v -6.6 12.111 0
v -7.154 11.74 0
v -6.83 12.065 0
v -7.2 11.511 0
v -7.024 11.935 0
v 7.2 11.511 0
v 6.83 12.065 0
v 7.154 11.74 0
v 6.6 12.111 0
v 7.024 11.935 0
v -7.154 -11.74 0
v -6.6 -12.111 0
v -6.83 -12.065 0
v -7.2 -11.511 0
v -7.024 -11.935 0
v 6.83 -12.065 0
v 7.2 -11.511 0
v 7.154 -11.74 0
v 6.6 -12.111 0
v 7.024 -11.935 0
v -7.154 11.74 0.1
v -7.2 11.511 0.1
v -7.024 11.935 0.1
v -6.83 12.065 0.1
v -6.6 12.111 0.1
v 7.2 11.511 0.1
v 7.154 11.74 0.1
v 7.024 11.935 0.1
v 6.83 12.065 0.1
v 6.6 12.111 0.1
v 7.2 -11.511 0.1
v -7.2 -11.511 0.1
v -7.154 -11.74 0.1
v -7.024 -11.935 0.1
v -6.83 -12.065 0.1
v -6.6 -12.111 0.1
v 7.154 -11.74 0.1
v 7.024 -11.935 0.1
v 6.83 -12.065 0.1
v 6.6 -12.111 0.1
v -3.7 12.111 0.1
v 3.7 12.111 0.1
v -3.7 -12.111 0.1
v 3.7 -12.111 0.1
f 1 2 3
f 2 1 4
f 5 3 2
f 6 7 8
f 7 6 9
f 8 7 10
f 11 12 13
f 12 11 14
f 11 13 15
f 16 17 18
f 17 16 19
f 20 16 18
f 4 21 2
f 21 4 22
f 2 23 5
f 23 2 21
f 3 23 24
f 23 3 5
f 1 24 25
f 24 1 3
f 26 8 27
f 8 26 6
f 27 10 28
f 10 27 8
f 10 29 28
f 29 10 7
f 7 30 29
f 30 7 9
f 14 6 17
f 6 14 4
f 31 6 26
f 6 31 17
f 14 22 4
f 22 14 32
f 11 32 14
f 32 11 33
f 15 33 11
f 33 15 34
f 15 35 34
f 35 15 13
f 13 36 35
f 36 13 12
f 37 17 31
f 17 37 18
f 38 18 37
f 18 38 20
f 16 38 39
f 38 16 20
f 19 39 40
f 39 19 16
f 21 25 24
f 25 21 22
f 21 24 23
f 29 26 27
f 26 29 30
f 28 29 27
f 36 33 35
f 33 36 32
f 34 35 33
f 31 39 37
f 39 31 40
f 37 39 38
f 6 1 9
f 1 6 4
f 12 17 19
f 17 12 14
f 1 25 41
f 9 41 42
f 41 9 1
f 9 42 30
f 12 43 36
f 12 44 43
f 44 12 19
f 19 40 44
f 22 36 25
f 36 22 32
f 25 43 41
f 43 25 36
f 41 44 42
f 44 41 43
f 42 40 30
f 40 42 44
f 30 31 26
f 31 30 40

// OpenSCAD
// file: ../p/box3u12.scad
use <../lib.scad>
function ldraw_lib__box3u12() = [
// 0 Box with 3 Parallel Faces without Any Edges
// 0 Name: box3u12.dat
// 0 Author: J.C. Tchang [tchang]
// 0 !LDRAW_ORG Primitive UPDATE 2014-02
// 0 !LICENSE Licensed under CC BY 2.0 and CC BY 4.0 : see CAreadme.txt
// 
// 0 BFC CERTIFY CCW
  [0,"BFC","CERTIFY"],
  [0,"BFC","CCW"],
// 
// 0 !HISTORY 2014-12-23 [PTadmin] Official Update 2014-02
// 
// 
// 4 16 -1 1 1 1 1 1 1 1 -1 -1 1 -1
  [4,16,-1,1,1,1,1,1,1,1,-1,-1,1,-1],
// 4 16 -1 1 1 -1 0 1 1 0 1 1 1 1
  [4,16,-1,1,1,-1,0,1,1,0,1,1,1,1],
// 4 16 1 1 -1 1 0 -1 -1 0 -1 -1 1 -1
  [4,16,1,1,-1,1,0,-1,-1,0,-1,-1,1,-1],
];
module ldraw_lib__box3u12(step=0, col=false, unit=2/5, alt=false, line=0.2, solid=!$preview)
    makepoly(ldraw_lib__box3u12(), step=step, col=col, unit=unit, alt=alt, line=line, solid=solid);
ldraw_lib__box3u12(line=0.2);
// file: ../p/1-4cyli.scad
use <../lib.scad>
function ldraw_lib__1_4cyli() = [
// 0 Cylinder 0.25
// 0 Name: 1-4cyli.dat
// 0 Author: James Jessiman
// 0 !LDRAW_ORG Primitive UPDATE 2012-01
// 0 !LICENSE Licensed under CC BY 2.0 and CC BY 4.0 : see CAreadme.txt
// 
// 0 BFC CERTIFY CCW
  [0,"BFC","CERTIFY"],
  [0,"BFC","CCW"],
// 
// 0 !HISTORY 2002-03-23 [sbliss] Added BFC statement.
// 0 !HISTORY 2002-04-25 [PTadmin] Official Update 2002-02
// 0 !HISTORY 2007-06-22 [PTadmin] Header formatted for Contributor Agreement
// 0 !HISTORY 2008-07-01 [PTadmin] Official Update 2008-01
// 0 !HISTORY 2012-02-16 [Philo] Changed to CCW
// 0 !HISTORY 2012-03-30 [PTadmin] Official Update 2012-01
// 
// 
// 4 16 1 1 0 0.9239 1 0.3827 0.9239 0 0.3827 1 0 0
  [4,16,1,1,0,0.9239,1,0.3827,0.9239,0,0.3827,1,0,0],
// 5 24 1 0 0 1 1 0 0.9239 0 0.3827 1 0 -1
  [5,24,1,0,0,1,1,0,0.9239,0,0.3827,1,0,-1],
// 4 16 0.9239 1 0.3827 0.7071 1 0.7071 0.7071 0 0.7071 0.9239 0 0.3827
  [4,16,0.9239,1,0.3827,0.7071,1,0.7071,0.7071,0,0.7071,0.9239,0,0.3827],
// 5 24 0.9239 0 0.3827 0.9239 1 0.3827 0.7071 0 0.7071 1 0 0
  [5,24,0.9239,0,0.3827,0.9239,1,0.3827,0.7071,0,0.7071,1,0,0],
// 4 16 0.7071 1 0.7071 0.3827 1 0.9239 0.3827 0 0.9239 0.7071 0 0.7071
  [4,16,0.7071,1,0.7071,0.3827,1,0.9239,0.3827,0,0.9239,0.7071,0,0.7071],
// 5 24 0.7071 0 0.7071 0.7071 1 0.7071 0.3827 0 0.9239 0.9239 0 0.3827
  [5,24,0.7071,0,0.7071,0.7071,1,0.7071,0.3827,0,0.9239,0.9239,0,0.3827],
// 4 16 0.3827 1 0.9239 0 1 1 0 0 1 0.3827 0 0.9239
  [4,16,0.3827,1,0.9239,0,1,1,0,0,1,0.3827,0,0.9239],
// 5 24 0.3827 0 0.9239 0.3827 1 0.9239 0 0 1 0.7071 0 0.7071
  [5,24,0.3827,0,0.9239,0.3827,1,0.9239,0,0,1,0.7071,0,0.7071],
// 5 24 0 0 1 0 1 1 0.3827 0 0.9239 -1 0 1
  [5,24,0,0,1,0,1,1,0.3827,0,0.9239,-1,0,1],
];
module ldraw_lib__1_4cyli(step=0, col=false, unit=2/5, alt=false, line=0.2, solid=!$preview)
    makepoly(ldraw_lib__1_4cyli(), step=step, col=col, unit=unit, alt=alt, line=line, solid=solid);
ldraw_lib__1_4cyli(line=0.2);
// file: ../p/1-4chrd.scad
use <../lib.scad>
function ldraw_lib__1_4chrd() = [
// 0 Chord 0.25
// 0 Name: 1-4chrd.dat
// 0 Author: Tony Hafner [hafhead]
// 0 !LDRAW_ORG Primitive UPDATE 2012-02
// 0 !LICENSE Licensed under CC BY 2.0 and CC BY 4.0 : see CAreadme.txt
// 
// 0 BFC CERTIFY CCW
  [0,"BFC","CERTIFY"],
  [0,"BFC","CCW"],
// 
// 0 !HISTORY 2004-04-22 [PTadmin] Official Update 2004-02
// 0 !HISTORY 2007-10-09 [PTadmin] Header formatted for Contributor Agreement
// 0 !HISTORY 2008-07-01 [PTadmin] Official Update 2008-01
// 0 !HISTORY 2012-08-02 [MMR1988] Re-creation with PrimGen2 and Rectifier
// 0 !HISTORY 2012-08-09 [PTadmin] Official Update 2012-02
// 
// 
// 4 16 0.9239 0 0.3827 0.3827 0 0.9239 0 0 1 1 0 0
  [4,16,0.9239,0,0.3827,0.3827,0,0.9239,0,0,1,1,0,0],
// 3 16 0.7071 0 0.7071 0.3827 0 0.9239 0.9239 0 0.3827
  [3,16,0.7071,0,0.7071,0.3827,0,0.9239,0.9239,0,0.3827],
];
module ldraw_lib__1_4chrd(step=0, col=false, unit=2/5, alt=false, line=0.2, solid=!$preview)
    makepoly(ldraw_lib__1_4chrd(), step=step, col=col, unit=unit, alt=alt, line=line, solid=solid);
ldraw_lib__1_4chrd(line=0.2);
// main file
use <../lib.scad>
use <../p/1-4chrd.scad>
use <../p/1-4cyli.scad>
use <../p/box3u12.scad>
function ldraw_lib__6142617t() = [
// 0 Sticker  3.0 x  1.8 with Black Stripe on White Background
// 0 Name: 6142617t.dat
// 0 Author: Massimo Maso [Sirio]
// 0 !LDRAW_ORG Part UPDATE 2022-05
// 0 !LICENSE Licensed under CC BY 2.0 and CC BY 4.0 : see CAreadme.txt
// 
// 0 BFC CERTIFY CCW
  [0,"BFC","CERTIFY"],
  [0,"BFC","CCW"],
// 
// 0 !KEYWORDS 1969, Camaro, Chevrolet, Drag, Race, Set 75874, Speed Champions
// 0 !KEYWORDS Z/28
// 
// 0 !HISTORY 2022-09-15 [PTadmin] Official Update 2022-05
// 
// 
// 0 // Primitives
// 1 16 -16.5 0 28.7768 -1.5 0 0 0 -1 0 0 0 1.5 1-4chrd.dat
  [1,16,-16.5,0,28.7768,-1.5,0,0,0,-1,0,0,0,1.5, ldraw_lib__1_4chrd()],
// 1 16 16.5 0 28.7768 1.5 0 0 0 -1 0 0 0 1.5 1-4chrd.dat
  [1,16,16.5,0,28.7768,1.5,0,0,0,-1,0,0,0,1.5, ldraw_lib__1_4chrd()],
// 1 16 -16.5 0 -28.7768 -1.5 0 0 0 -1 0 0 0 -1.5 1-4chrd.dat
  [1,16,-16.5,0,-28.7768,-1.5,0,0,0,-1,0,0,0,-1.5, ldraw_lib__1_4chrd()],
// 1 16 16.5 0 -28.7768 1.5 0 0 0 -1 0 0 0 -1.5 1-4chrd.dat
  [1,16,16.5,0,-28.7768,1.5,0,0,0,-1,0,0,0,-1.5, ldraw_lib__1_4chrd()],
// 1 16 -16.5 -0.25 28.7768 -1.5 0 0 0 0.25 0 0 0 1.5 1-4cyli.dat
  [1,16,-16.5,-0.25,28.7768,-1.5,0,0,0,0.25,0,0,0,1.5, ldraw_lib__1_4cyli()],
// 1 16 16.5 -0.25 28.7768 1.5 0 0 0 0.25 0 0 0 1.5 1-4cyli.dat
  [1,16,16.5,-0.25,28.7768,1.5,0,0,0,0.25,0,0,0,1.5, ldraw_lib__1_4cyli()],
// 1 16 0 -.25 0 0 0 18 0 .25 0 28.7768 0 0 box3u12.dat
  [1,16,0,-.25,0,0,0,18,0,.25,0,28.7768,0,0, ldraw_lib__box3u12()],
// 1 16 -16.5 -0.25 -28.7768 -1.5 0 0 0 0.25 0 0 0 -1.5 1-4cyli.dat
  [1,16,-16.5,-0.25,-28.7768,-1.5,0,0,0,0.25,0,0,0,-1.5, ldraw_lib__1_4cyli()],
// 1 16 16.5 -0.25 -28.7768 1.5 0 0 0 0.25 0 0 0 -1.5 1-4cyli.dat
  [1,16,16.5,-0.25,-28.7768,1.5,0,0,0,0.25,0,0,0,-1.5, ldraw_lib__1_4cyli()],
// 1 15 -16.5 -.25 28.7768 -1.5 0 0 0 1 0 0 0 1.5 1-4chrd.dat
  [1,15,-16.5,-.25,28.7768,-1.5,0,0,0,1,0,0,0,1.5, ldraw_lib__1_4chrd()],
// 1 15 16.5 -.25 28.7768 1.5 0 0 0 1 0 0 0 1.5 1-4chrd.dat
  [1,15,16.5,-.25,28.7768,1.5,0,0,0,1,0,0,0,1.5, ldraw_lib__1_4chrd()],
// 1 15 -16.5 -.25 -28.7768 -1.5 0 0 0 1 0 0 0 -1.5 1-4chrd.dat
  [1,15,-16.5,-.25,-28.7768,-1.5,0,0,0,1,0,0,0,-1.5, ldraw_lib__1_4chrd()],
// 1 15 16.5 -.25 -28.7768 1.5 0 0 0 1 0 0 0 -1.5 1-4chrd.dat
  [1,15,16.5,-.25,-28.7768,1.5,0,0,0,1,0,0,0,-1.5, ldraw_lib__1_4chrd()],
// 0 // Bottom face
// 4 16 -16.5 0 30.2768 16.5 0 30.2768 18 0 28.7768 -18 0 28.7768
  [4,16,-16.5,0,30.2768,16.5,0,30.2768,18,0,28.7768,-18,0,28.7768],
// 4 16 -16.5 0 -30.2768 -18 0 -28.7768 18 0 -28.7768 16.5 0 -30.2768
  [4,16,-16.5,0,-30.2768,-18,0,-28.7768,18,0,-28.7768,16.5,0,-30.2768],
// 0 // Lateral face
// 3 16 -16.5 0 30.2768 -16.5 -.25 30.2768 -9.25 -.25 30.2768
  [3,16,-16.5,0,30.2768,-16.5,-.25,30.2768,-9.25,-.25,30.2768],
// 4 16 -16.5 0 30.2768 -9.25 -.25 30.2768 9.25 -.25 30.2768 16.5 0 30.2768
  [4,16,-16.5,0,30.2768,-9.25,-.25,30.2768,9.25,-.25,30.2768,16.5,0,30.2768],
// 3 16 16.5 0 30.2768 9.25 -.25 30.2768 16.5 -.25 30.2768
  [3,16,16.5,0,30.2768,9.25,-.25,30.2768,16.5,-.25,30.2768],
// 3 16 -16.5 0 -30.2768 -9.25 -.25 -30.2768 -16.5 -.25 -30.2768
  [3,16,-16.5,0,-30.2768,-9.25,-.25,-30.2768,-16.5,-.25,-30.2768],
// 4 16 -16.5 0 -30.2768 16.5 0 -30.2768 9.25 -.25 -30.2768 -9.25 -.25 -30.2768
  [4,16,-16.5,0,-30.2768,16.5,0,-30.2768,9.25,-.25,-30.2768,-9.25,-.25,-30.2768],
// 3 16 16.5 0 -30.2768 16.5 -.25 -30.2768 9.25 -.25 -30.2768
  [3,16,16.5,0,-30.2768,16.5,-.25,-30.2768,9.25,-.25,-30.2768],
// 0 // Top face
// 4 15 -16.5 -.25 30.2768 -18 -.25 28.7768 -18 -.25 -28.7768 -16.5 -.25 -30.2768
  [4,15,-16.5,-.25,30.2768,-18,-.25,28.7768,-18,-.25,-28.7768,-16.5,-.25,-30.2768],
// 4 15 -16.5 -.25 30.2768 -16.5 -.25 -30.2768 -9.25 -.25 -30.2768 -9.25 -.25 30.2768
  [4,15,-16.5,-.25,30.2768,-16.5,-.25,-30.2768,-9.25,-.25,-30.2768,-9.25,-.25,30.2768],
// 4 0 -9.25 -.25 30.2768 -9.25 -.25 -30.2768 9.25 -.25 -30.2768 9.25 -.25 30.2768
  [4,0,-9.25,-.25,30.2768,-9.25,-.25,-30.2768,9.25,-.25,-30.2768,9.25,-.25,30.2768],
// 4 15 16.5 -.25 30.2768 9.25 -.25 30.2768 9.25 -.25 -30.2768 16.5 -.25 -30.2768
  [4,15,16.5,-.25,30.2768,9.25,-.25,30.2768,9.25,-.25,-30.2768,16.5,-.25,-30.2768],
// 4 15 16.5 -.25 30.2768 16.5 -.25 -30.2768 18 -.25 -28.7768 18 -.25 28.7768
  [4,15,16.5,-.25,30.2768,16.5,-.25,-30.2768,18,-.25,-28.7768,18,-.25,28.7768],
];
module ldraw_lib__6142617t(step=0, col=false, unit=2/5, alt=false, line=0.2, solid=!$preview)
    makepoly(ldraw_lib__6142617t(), step=step, col=col, unit=unit, alt=alt, line=line, solid=solid);
ldraw_lib__6142617t(line=0.2);
